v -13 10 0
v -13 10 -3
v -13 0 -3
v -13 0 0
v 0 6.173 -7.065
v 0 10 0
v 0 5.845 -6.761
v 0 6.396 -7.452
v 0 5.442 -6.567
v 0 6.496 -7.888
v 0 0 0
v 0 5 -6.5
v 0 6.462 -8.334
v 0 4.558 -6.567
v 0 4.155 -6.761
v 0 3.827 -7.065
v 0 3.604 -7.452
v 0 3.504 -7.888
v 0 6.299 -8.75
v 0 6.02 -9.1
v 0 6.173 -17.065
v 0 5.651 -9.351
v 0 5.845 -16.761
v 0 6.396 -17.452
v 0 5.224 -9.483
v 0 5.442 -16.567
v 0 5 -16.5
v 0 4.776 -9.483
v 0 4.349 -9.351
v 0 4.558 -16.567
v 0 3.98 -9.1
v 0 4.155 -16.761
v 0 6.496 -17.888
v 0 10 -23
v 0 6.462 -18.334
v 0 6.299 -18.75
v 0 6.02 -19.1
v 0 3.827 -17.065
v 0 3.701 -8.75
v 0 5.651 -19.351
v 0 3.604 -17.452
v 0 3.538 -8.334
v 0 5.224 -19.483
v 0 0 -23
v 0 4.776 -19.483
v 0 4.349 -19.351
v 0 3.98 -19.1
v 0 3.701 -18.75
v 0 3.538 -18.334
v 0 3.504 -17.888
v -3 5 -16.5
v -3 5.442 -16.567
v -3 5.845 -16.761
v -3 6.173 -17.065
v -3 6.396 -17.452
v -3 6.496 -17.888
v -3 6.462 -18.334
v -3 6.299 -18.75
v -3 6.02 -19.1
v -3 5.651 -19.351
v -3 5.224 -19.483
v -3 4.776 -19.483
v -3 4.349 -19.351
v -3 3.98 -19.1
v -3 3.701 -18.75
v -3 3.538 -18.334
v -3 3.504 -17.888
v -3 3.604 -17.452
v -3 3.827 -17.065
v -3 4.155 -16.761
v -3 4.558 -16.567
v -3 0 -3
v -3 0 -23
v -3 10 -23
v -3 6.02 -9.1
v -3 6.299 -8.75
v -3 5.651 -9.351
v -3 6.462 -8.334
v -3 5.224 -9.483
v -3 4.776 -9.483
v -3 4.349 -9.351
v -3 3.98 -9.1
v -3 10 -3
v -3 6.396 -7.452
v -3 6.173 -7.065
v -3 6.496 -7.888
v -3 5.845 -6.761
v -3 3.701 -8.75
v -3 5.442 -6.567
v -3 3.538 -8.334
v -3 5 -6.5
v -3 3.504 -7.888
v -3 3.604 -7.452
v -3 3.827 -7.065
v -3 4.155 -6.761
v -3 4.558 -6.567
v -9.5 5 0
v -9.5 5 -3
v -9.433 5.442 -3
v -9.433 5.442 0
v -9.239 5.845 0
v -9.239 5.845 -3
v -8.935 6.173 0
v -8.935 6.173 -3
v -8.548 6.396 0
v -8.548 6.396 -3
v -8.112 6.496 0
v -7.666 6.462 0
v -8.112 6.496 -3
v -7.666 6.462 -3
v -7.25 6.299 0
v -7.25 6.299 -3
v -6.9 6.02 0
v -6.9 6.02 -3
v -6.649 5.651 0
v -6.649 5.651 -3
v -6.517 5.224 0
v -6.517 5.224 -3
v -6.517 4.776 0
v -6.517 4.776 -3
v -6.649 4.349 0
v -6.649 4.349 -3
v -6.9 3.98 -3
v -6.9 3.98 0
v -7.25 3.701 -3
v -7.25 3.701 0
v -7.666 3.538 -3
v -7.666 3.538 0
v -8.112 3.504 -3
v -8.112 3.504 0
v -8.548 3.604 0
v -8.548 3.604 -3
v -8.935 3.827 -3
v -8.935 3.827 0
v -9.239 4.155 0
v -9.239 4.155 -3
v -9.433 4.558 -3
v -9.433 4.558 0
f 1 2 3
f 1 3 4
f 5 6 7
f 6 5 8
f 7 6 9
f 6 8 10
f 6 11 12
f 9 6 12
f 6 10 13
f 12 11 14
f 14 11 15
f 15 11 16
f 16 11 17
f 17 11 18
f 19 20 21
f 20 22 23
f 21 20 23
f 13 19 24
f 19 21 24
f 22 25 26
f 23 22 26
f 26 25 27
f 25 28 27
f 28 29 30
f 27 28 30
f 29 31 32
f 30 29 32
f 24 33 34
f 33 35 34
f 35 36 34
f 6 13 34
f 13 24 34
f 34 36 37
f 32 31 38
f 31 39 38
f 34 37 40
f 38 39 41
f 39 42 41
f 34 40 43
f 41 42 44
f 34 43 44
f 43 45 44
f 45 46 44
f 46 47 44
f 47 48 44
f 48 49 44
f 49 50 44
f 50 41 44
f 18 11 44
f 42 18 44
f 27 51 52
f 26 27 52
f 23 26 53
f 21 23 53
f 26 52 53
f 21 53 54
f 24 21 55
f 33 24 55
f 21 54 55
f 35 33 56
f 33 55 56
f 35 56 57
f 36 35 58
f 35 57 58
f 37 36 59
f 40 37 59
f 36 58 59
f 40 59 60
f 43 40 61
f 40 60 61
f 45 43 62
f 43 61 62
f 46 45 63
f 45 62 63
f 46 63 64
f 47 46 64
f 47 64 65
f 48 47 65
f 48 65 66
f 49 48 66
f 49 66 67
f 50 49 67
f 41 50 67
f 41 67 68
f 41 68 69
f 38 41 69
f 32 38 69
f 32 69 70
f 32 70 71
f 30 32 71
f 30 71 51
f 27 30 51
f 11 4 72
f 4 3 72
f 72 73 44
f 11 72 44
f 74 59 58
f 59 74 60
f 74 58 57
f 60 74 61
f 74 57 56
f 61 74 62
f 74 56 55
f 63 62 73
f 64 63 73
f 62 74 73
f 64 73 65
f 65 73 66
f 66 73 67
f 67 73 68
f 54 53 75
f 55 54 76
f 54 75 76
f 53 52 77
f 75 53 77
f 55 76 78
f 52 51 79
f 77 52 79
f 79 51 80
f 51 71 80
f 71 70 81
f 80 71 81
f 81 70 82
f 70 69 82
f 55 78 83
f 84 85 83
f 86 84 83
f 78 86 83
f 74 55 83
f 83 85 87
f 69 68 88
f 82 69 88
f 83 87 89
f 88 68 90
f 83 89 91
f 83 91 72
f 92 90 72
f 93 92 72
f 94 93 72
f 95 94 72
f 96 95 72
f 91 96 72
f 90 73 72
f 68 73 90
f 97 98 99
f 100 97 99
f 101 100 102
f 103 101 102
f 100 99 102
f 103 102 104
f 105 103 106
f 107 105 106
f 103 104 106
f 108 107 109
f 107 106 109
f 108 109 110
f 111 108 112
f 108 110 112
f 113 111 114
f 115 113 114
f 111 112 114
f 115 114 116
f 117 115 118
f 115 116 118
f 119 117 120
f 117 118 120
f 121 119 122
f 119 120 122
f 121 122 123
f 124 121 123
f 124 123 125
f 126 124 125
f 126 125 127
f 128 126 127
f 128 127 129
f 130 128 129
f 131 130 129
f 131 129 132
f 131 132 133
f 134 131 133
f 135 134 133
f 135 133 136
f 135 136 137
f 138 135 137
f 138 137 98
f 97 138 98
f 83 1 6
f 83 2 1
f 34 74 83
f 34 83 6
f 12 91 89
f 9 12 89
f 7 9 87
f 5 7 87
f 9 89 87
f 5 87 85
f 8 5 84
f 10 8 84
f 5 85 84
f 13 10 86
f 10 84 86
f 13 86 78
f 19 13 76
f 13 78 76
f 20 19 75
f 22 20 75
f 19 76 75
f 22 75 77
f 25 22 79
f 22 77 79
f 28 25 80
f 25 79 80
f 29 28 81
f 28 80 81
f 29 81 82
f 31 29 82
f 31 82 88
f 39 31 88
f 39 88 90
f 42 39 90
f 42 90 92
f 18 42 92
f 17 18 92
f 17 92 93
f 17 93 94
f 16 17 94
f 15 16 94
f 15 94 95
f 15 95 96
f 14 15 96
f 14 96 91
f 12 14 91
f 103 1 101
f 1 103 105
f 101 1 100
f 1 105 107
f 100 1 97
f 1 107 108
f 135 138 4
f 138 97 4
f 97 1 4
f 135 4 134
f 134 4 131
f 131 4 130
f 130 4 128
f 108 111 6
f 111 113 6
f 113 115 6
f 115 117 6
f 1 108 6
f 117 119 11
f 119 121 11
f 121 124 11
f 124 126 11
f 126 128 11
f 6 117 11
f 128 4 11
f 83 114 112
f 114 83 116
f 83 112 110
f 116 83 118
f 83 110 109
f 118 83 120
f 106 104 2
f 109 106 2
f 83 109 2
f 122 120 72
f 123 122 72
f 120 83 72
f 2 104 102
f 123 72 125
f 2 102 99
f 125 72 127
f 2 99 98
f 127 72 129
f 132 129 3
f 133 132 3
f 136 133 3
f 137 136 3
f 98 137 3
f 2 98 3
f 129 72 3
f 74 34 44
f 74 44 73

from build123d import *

# Parameters (mm, degrees)
EXTRUDE_1_DEPTH     = 10
SKETCH_2_R          = 1.5
CUT_EXTRUDE_1_DEPTH = 10
SKETCH_3_R          = 1.5
CUT_EXTRUDE_2_DEPTH = 10


with BuildPart() as part:
    # 草图1 → 凸台-拉伸1 (new body)
    with BuildSketch(Plane(origin=(0, 0, 0), x_dir=(1, 0, 0), z_dir=(0, 1, 0))):
        Polygon((-13, 0), (0, 0), (0, 23), (-3, 23), (-3, 3), (-13, 3), align=None)
    extrude(amount=EXTRUDE_1_DEPTH)

    # 草图2 → 切除-拉伸1 (cut)
    with BuildSketch(Plane.ZY.offset(3)):
        with Locations((-18, 5)):
            Circle(SKETCH_2_R)
        with Locations((-8, 5)):
            Circle(SKETCH_2_R)
    extrude(amount=-CUT_EXTRUDE_1_DEPTH, mode=Mode.SUBTRACT)

    # 草图3 → 切除-拉伸2 (cut)
    with BuildSketch(Plane(origin=(0, 0, -3), x_dir=(-1, 0, 0), z_dir=(0, 0, -1))):
        with Locations((8, 5)):
            Circle(SKETCH_3_R)
        with Locations((-2, 5)):
            Circle(SKETCH_3_R)
    extrude(amount=-CUT_EXTRUDE_2_DEPTH, mode=Mode.SUBTRACT)


solid = part.part
